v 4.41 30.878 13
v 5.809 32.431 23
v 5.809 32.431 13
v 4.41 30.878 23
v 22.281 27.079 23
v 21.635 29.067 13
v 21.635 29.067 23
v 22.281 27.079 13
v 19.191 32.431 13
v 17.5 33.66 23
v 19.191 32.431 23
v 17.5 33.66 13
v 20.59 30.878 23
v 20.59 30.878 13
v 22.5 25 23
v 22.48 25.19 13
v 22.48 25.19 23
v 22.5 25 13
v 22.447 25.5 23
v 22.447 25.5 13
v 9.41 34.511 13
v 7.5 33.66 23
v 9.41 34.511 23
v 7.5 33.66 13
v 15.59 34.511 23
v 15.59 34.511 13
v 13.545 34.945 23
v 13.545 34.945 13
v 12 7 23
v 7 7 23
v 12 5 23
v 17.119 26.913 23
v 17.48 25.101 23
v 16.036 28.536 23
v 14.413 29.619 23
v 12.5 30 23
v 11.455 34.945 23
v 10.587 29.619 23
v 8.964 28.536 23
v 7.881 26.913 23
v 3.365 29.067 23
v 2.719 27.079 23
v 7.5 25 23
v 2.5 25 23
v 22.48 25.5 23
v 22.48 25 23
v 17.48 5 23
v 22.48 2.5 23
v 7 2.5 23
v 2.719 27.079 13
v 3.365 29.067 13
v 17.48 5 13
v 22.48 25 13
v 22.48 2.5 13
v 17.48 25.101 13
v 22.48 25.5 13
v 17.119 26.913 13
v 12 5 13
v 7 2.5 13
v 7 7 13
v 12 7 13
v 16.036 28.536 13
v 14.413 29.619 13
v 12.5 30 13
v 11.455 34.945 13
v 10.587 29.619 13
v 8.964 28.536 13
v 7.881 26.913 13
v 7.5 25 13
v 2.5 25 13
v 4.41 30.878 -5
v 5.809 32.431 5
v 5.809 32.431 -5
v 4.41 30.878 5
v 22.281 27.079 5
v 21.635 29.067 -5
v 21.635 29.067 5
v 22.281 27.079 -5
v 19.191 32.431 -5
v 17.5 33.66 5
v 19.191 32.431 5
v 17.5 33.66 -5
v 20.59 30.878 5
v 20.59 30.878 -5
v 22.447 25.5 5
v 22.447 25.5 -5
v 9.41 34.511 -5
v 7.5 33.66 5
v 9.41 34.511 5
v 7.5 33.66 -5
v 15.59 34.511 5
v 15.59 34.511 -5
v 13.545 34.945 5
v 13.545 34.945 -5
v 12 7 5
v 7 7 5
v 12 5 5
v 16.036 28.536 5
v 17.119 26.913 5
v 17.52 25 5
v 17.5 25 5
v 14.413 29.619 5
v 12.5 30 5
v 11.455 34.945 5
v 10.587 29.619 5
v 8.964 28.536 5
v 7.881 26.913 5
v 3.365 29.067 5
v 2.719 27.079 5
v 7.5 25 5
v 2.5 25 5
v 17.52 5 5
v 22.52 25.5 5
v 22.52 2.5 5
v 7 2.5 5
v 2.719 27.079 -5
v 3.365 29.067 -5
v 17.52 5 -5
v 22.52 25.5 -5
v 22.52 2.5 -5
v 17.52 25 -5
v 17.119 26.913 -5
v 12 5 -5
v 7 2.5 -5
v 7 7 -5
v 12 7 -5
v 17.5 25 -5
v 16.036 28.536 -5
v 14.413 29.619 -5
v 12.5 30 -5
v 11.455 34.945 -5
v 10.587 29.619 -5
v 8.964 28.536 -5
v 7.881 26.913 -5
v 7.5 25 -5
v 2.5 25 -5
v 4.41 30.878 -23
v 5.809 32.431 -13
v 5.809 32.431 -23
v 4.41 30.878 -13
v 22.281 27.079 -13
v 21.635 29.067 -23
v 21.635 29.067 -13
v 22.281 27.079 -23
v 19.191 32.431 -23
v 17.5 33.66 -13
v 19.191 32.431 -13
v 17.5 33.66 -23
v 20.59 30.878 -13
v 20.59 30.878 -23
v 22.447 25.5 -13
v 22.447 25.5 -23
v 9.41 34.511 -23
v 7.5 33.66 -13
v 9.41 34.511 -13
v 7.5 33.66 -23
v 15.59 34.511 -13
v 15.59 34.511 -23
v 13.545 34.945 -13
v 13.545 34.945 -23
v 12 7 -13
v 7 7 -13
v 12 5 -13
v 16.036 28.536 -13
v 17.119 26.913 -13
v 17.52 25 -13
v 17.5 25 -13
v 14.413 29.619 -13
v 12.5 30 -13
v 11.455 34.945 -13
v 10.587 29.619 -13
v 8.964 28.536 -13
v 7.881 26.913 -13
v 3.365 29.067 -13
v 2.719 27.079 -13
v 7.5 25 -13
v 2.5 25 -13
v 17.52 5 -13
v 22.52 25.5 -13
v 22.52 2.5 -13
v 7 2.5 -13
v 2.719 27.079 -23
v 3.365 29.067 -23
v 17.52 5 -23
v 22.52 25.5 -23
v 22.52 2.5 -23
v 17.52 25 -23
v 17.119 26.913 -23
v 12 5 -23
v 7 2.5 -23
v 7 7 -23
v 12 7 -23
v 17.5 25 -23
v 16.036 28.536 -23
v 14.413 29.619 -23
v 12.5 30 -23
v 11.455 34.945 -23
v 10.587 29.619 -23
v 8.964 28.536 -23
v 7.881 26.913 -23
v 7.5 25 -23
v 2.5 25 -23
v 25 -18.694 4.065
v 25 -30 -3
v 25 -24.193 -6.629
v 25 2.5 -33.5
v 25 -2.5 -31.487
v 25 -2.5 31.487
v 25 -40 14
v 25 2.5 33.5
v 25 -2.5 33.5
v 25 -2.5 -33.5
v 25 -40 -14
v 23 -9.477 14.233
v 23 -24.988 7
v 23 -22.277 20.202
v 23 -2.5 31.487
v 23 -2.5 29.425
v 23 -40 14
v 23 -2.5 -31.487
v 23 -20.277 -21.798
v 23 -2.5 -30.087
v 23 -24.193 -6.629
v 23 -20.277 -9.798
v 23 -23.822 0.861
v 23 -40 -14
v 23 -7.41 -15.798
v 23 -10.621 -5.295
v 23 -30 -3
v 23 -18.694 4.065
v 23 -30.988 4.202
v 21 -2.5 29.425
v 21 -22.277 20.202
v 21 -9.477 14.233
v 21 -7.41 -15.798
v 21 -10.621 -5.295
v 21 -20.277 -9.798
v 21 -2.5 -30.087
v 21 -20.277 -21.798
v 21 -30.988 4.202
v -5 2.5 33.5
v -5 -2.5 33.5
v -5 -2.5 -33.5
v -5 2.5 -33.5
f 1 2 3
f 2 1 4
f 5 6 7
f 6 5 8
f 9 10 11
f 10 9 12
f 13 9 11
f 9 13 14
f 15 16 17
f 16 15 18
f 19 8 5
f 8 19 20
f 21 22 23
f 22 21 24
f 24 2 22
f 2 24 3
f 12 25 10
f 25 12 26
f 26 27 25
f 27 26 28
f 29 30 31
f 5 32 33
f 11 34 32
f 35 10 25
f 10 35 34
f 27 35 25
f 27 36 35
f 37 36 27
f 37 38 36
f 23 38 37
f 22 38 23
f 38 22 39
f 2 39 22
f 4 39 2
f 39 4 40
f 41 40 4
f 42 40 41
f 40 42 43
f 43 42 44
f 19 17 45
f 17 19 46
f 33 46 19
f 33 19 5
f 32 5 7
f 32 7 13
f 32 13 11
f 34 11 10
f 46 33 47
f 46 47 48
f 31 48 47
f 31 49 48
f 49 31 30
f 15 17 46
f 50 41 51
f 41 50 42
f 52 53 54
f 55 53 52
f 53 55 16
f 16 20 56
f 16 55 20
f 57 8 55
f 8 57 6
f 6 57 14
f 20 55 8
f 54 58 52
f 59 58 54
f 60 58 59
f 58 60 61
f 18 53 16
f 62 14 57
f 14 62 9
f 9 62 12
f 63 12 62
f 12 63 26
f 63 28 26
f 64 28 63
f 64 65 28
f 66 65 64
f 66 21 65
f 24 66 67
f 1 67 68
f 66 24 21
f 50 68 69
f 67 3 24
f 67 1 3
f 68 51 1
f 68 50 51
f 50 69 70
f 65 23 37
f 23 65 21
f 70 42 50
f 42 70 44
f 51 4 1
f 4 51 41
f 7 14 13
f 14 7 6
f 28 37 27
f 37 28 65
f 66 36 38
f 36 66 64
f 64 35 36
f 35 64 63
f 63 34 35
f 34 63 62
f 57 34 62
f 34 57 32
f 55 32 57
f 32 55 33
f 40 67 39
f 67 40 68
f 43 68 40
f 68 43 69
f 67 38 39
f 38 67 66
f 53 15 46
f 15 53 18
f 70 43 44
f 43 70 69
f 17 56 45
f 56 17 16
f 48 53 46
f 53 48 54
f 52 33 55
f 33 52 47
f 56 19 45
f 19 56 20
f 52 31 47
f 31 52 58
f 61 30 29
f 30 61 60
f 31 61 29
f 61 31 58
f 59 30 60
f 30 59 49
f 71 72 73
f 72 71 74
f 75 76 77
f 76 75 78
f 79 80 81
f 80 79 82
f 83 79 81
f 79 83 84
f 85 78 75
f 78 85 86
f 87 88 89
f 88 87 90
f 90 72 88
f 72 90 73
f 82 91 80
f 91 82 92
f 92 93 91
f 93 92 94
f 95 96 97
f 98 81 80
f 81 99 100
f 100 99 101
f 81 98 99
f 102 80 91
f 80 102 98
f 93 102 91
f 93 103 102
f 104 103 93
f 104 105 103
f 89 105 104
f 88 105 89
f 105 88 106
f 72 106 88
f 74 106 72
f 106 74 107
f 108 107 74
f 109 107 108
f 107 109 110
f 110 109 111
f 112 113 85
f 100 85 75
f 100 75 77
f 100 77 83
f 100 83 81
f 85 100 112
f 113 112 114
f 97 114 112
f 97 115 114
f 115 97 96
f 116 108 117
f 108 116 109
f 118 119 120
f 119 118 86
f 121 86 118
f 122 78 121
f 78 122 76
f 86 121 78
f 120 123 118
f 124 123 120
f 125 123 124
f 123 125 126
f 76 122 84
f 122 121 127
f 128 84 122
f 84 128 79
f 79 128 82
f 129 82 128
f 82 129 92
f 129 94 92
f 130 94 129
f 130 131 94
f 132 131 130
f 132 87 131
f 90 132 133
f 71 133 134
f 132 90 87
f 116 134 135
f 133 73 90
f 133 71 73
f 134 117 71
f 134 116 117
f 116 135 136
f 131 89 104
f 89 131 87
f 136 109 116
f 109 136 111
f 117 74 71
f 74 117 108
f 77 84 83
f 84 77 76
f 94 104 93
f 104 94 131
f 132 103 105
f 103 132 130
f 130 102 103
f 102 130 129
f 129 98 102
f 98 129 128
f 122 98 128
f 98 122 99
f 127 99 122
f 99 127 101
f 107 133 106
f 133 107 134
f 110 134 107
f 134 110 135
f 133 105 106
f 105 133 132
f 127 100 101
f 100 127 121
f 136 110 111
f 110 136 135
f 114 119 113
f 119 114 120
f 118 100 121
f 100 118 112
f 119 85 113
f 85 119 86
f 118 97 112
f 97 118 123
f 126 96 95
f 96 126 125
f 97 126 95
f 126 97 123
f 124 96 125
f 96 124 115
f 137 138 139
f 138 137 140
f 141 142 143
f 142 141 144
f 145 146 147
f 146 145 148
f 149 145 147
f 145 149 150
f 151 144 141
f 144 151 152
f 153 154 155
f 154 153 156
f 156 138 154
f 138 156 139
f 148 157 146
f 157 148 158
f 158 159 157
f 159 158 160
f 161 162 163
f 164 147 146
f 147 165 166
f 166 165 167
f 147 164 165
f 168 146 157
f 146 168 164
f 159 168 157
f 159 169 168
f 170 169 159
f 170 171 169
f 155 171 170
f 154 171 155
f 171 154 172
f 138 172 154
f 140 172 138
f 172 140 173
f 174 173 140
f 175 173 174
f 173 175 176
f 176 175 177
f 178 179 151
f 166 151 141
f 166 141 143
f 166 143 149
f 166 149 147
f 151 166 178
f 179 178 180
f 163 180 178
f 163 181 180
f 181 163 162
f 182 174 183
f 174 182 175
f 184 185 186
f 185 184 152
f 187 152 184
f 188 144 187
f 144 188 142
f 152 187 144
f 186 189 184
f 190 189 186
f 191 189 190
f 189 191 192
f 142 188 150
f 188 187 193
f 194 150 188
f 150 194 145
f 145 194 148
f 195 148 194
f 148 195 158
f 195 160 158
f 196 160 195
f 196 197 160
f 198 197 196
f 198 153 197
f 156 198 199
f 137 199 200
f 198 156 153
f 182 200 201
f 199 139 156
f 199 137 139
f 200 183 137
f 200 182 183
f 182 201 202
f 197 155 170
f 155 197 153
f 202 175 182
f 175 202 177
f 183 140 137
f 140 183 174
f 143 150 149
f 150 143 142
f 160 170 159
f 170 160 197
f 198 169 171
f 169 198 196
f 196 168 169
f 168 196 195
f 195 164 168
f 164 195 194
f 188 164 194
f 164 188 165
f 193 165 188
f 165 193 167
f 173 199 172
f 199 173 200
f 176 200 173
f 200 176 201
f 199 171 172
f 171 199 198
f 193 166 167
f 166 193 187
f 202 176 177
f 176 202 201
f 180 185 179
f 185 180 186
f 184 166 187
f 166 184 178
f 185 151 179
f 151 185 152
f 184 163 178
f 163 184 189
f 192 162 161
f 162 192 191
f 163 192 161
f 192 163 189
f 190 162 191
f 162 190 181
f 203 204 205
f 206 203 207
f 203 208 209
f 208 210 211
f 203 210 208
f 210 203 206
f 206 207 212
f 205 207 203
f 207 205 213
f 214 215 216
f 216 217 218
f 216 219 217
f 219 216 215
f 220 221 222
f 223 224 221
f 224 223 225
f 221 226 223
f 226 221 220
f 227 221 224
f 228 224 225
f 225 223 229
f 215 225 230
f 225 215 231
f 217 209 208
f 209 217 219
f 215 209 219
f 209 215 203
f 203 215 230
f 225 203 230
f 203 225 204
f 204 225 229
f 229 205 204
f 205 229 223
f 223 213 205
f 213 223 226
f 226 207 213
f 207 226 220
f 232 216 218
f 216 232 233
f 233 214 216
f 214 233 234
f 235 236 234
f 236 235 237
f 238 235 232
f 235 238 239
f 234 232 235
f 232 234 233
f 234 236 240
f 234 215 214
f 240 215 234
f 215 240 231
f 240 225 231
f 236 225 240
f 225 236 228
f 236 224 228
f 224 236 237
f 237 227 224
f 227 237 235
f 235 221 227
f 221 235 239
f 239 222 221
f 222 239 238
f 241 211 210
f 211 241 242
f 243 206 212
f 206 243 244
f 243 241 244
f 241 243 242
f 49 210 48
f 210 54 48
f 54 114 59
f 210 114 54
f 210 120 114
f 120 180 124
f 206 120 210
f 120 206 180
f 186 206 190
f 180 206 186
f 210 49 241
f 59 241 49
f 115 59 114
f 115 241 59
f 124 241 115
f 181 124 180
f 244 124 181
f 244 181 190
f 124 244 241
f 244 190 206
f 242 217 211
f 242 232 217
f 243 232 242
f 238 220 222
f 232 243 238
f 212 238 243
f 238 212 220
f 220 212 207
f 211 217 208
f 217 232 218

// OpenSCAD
//key holder
// Koko Niitani

translate([20,30,18]){
	translate([-0.02,-17,0]){
        cube([5,25,10], center=true);
    };
translate([-4,-27.5,0])rotate([0,180,90]){cube([5,10,10], center=true);
	}
translate([-8,-23,5])rotate([0,180,90])cube([7,5,10]);
	
	translate([-7.5,-5,5]){
	rotate([180,0,0]){
    	difference(){
        	cylinder(h=10,r=10);
    	translate([0,0,-3]) cylinder(h=15,r=5);
    	translate([-10,0,-1]) cube([20,10,30]);
	};
};
};
};
translate([20,30,0]){
	translate([0.02,-17,0]){
        cube([5,25,10], center=true);
    };
translate([-4,-27.5,0])rotate([0,180,90]){cube([5,10,10], center=true);
	}
translate([-8,-23,5])rotate([0,180,90])cube([7,5,10]);
	
	translate([-7.5,-5,5]){
	rotate([180,0,0]){
    	difference(){
        	cylinder(h=10,r=10);
    	translate([0,0,-1]) cylinder(h=15,r=5);
    	translate([-10,0,-1]) cube([20,10,30]);
	};
};
};
};
translate([20,30,-18]){
    translate([0.02,-17,0]){
        cube([5,25,10], center=true);
    };
translate([-4,-27.5,0])rotate([0,180,90]){cube([5,10,10], center=true);
	}
translate([-8,-23,5])rotate([0,180,90])cube([7,5,10]);
	
	translate([-7.5,-5,5]){
	rotate([180,0,0]){
    	difference(){
        	cylinder(h=10,r=10);
    	translate([0,0,-1]) cylinder(h=15,r=5);
    	translate([-10,0,-1]) cube([20,10,30]);
	};
};
};
};
translate([10,0,0]){
    cube([30,5,67], center=true);
};
translate([3,0,9]){
    translate([20,-40,5]){
    difference(){
    cube([2,40,20]);
   rotate([25,0,0]){
       translate([-1,0,0]){
    cube([4,45,20]);
       };
       };
   };
};
rotate([0,180,0]){
    translate([-22,-40,-5]){
    difference(){
    cube([2,40,20]);
   rotate([25,0,0]){
       translate([-1,0,0]){
    cube([4,45,20]);
       };
       };
       };
   };
};
};

translate([3,0,12]){
    translate([20,-30,-15]){
difference(){
    cube([2,30,20]);
    translate([-1,0,0]){
    rotate([32,0,0])cube([4,40,20]);
    };
};
};
translate([22,-30,-15]){
    rotate([0,180,0])difference(){
    cube([2,30,20]);
    translate([-1,0,0]){
    rotate([32,0,0])cube([4,40,20]);
    };
};
};
};

translate([3,0,-19]){
    translate([20,-40,5]){
    difference(){
    cube([2,40,20]);
   rotate([25,0,0]){
       translate([-1,0,0]){
    cube([4,45,20]);
       };
       };
   };
};
rotate([0,180,0]){
    translate([-22,-40,-5]){
    difference(){
    cube([2,40,20]);
   rotate([25,0,0]){
       translate([-1,0,0]){
    cube([4,45,20]);
       };
       };
       };
   };
};
};

translate([21,-27,10 ]){
    difference(){
cube([2,25,20]);
    translate([0,0,8]){
        rotate([25,0,0])translate([-0.5,0,0]){
        cube([3,30,20]);
        };
       translate([0,-10,-13]){
           rotate([-25,0,0]){
           translate([-0.5,0,0]){
           cube([3,30,20]);
           };
           };
           }
       };
    };
};

translate([21,-40,-10]){
    difference(){
    cube([2,40,30]);
    translate([0,0,10]){
        rotate([25,0,0]){
        translate([-2,0,0]){
        cube([5,50,20]);
        };
        };
    };
    translate([0,-10,1]){
        rotate([-25,0,0]){
        translate([-2,0,0]){
        cube([5,50,20]);
        };
        };
    };
};
};

    translate([21,-25,-20]){
        difference(){
cube([2,25,20]);
    translate([0,0,8]){
        rotate([25,0,0])translate([-0.5,0,0]){
        cube([3,30,20]);
        };
       translate([0,-10,-13]){
           rotate([-25,0,0]){
           translate([-0.5,0,0]){
           cube([3,30,20]);
           };
           };
           }
       };
    };
};

 translate([21,-25,-32]){
     difference(){
cube([2,25,20]);
    translate([0,0,8]){
        rotate([25,0,0])translate([-0.5,0,0]){
        cube([3,30,20]);
        };
       translate([0,-10,-13]){
           rotate([-25,0,0]){
           translate([-0.5,0,0]){
           cube([3,30,20]);
           };
           };
           }
       };
    };
};
